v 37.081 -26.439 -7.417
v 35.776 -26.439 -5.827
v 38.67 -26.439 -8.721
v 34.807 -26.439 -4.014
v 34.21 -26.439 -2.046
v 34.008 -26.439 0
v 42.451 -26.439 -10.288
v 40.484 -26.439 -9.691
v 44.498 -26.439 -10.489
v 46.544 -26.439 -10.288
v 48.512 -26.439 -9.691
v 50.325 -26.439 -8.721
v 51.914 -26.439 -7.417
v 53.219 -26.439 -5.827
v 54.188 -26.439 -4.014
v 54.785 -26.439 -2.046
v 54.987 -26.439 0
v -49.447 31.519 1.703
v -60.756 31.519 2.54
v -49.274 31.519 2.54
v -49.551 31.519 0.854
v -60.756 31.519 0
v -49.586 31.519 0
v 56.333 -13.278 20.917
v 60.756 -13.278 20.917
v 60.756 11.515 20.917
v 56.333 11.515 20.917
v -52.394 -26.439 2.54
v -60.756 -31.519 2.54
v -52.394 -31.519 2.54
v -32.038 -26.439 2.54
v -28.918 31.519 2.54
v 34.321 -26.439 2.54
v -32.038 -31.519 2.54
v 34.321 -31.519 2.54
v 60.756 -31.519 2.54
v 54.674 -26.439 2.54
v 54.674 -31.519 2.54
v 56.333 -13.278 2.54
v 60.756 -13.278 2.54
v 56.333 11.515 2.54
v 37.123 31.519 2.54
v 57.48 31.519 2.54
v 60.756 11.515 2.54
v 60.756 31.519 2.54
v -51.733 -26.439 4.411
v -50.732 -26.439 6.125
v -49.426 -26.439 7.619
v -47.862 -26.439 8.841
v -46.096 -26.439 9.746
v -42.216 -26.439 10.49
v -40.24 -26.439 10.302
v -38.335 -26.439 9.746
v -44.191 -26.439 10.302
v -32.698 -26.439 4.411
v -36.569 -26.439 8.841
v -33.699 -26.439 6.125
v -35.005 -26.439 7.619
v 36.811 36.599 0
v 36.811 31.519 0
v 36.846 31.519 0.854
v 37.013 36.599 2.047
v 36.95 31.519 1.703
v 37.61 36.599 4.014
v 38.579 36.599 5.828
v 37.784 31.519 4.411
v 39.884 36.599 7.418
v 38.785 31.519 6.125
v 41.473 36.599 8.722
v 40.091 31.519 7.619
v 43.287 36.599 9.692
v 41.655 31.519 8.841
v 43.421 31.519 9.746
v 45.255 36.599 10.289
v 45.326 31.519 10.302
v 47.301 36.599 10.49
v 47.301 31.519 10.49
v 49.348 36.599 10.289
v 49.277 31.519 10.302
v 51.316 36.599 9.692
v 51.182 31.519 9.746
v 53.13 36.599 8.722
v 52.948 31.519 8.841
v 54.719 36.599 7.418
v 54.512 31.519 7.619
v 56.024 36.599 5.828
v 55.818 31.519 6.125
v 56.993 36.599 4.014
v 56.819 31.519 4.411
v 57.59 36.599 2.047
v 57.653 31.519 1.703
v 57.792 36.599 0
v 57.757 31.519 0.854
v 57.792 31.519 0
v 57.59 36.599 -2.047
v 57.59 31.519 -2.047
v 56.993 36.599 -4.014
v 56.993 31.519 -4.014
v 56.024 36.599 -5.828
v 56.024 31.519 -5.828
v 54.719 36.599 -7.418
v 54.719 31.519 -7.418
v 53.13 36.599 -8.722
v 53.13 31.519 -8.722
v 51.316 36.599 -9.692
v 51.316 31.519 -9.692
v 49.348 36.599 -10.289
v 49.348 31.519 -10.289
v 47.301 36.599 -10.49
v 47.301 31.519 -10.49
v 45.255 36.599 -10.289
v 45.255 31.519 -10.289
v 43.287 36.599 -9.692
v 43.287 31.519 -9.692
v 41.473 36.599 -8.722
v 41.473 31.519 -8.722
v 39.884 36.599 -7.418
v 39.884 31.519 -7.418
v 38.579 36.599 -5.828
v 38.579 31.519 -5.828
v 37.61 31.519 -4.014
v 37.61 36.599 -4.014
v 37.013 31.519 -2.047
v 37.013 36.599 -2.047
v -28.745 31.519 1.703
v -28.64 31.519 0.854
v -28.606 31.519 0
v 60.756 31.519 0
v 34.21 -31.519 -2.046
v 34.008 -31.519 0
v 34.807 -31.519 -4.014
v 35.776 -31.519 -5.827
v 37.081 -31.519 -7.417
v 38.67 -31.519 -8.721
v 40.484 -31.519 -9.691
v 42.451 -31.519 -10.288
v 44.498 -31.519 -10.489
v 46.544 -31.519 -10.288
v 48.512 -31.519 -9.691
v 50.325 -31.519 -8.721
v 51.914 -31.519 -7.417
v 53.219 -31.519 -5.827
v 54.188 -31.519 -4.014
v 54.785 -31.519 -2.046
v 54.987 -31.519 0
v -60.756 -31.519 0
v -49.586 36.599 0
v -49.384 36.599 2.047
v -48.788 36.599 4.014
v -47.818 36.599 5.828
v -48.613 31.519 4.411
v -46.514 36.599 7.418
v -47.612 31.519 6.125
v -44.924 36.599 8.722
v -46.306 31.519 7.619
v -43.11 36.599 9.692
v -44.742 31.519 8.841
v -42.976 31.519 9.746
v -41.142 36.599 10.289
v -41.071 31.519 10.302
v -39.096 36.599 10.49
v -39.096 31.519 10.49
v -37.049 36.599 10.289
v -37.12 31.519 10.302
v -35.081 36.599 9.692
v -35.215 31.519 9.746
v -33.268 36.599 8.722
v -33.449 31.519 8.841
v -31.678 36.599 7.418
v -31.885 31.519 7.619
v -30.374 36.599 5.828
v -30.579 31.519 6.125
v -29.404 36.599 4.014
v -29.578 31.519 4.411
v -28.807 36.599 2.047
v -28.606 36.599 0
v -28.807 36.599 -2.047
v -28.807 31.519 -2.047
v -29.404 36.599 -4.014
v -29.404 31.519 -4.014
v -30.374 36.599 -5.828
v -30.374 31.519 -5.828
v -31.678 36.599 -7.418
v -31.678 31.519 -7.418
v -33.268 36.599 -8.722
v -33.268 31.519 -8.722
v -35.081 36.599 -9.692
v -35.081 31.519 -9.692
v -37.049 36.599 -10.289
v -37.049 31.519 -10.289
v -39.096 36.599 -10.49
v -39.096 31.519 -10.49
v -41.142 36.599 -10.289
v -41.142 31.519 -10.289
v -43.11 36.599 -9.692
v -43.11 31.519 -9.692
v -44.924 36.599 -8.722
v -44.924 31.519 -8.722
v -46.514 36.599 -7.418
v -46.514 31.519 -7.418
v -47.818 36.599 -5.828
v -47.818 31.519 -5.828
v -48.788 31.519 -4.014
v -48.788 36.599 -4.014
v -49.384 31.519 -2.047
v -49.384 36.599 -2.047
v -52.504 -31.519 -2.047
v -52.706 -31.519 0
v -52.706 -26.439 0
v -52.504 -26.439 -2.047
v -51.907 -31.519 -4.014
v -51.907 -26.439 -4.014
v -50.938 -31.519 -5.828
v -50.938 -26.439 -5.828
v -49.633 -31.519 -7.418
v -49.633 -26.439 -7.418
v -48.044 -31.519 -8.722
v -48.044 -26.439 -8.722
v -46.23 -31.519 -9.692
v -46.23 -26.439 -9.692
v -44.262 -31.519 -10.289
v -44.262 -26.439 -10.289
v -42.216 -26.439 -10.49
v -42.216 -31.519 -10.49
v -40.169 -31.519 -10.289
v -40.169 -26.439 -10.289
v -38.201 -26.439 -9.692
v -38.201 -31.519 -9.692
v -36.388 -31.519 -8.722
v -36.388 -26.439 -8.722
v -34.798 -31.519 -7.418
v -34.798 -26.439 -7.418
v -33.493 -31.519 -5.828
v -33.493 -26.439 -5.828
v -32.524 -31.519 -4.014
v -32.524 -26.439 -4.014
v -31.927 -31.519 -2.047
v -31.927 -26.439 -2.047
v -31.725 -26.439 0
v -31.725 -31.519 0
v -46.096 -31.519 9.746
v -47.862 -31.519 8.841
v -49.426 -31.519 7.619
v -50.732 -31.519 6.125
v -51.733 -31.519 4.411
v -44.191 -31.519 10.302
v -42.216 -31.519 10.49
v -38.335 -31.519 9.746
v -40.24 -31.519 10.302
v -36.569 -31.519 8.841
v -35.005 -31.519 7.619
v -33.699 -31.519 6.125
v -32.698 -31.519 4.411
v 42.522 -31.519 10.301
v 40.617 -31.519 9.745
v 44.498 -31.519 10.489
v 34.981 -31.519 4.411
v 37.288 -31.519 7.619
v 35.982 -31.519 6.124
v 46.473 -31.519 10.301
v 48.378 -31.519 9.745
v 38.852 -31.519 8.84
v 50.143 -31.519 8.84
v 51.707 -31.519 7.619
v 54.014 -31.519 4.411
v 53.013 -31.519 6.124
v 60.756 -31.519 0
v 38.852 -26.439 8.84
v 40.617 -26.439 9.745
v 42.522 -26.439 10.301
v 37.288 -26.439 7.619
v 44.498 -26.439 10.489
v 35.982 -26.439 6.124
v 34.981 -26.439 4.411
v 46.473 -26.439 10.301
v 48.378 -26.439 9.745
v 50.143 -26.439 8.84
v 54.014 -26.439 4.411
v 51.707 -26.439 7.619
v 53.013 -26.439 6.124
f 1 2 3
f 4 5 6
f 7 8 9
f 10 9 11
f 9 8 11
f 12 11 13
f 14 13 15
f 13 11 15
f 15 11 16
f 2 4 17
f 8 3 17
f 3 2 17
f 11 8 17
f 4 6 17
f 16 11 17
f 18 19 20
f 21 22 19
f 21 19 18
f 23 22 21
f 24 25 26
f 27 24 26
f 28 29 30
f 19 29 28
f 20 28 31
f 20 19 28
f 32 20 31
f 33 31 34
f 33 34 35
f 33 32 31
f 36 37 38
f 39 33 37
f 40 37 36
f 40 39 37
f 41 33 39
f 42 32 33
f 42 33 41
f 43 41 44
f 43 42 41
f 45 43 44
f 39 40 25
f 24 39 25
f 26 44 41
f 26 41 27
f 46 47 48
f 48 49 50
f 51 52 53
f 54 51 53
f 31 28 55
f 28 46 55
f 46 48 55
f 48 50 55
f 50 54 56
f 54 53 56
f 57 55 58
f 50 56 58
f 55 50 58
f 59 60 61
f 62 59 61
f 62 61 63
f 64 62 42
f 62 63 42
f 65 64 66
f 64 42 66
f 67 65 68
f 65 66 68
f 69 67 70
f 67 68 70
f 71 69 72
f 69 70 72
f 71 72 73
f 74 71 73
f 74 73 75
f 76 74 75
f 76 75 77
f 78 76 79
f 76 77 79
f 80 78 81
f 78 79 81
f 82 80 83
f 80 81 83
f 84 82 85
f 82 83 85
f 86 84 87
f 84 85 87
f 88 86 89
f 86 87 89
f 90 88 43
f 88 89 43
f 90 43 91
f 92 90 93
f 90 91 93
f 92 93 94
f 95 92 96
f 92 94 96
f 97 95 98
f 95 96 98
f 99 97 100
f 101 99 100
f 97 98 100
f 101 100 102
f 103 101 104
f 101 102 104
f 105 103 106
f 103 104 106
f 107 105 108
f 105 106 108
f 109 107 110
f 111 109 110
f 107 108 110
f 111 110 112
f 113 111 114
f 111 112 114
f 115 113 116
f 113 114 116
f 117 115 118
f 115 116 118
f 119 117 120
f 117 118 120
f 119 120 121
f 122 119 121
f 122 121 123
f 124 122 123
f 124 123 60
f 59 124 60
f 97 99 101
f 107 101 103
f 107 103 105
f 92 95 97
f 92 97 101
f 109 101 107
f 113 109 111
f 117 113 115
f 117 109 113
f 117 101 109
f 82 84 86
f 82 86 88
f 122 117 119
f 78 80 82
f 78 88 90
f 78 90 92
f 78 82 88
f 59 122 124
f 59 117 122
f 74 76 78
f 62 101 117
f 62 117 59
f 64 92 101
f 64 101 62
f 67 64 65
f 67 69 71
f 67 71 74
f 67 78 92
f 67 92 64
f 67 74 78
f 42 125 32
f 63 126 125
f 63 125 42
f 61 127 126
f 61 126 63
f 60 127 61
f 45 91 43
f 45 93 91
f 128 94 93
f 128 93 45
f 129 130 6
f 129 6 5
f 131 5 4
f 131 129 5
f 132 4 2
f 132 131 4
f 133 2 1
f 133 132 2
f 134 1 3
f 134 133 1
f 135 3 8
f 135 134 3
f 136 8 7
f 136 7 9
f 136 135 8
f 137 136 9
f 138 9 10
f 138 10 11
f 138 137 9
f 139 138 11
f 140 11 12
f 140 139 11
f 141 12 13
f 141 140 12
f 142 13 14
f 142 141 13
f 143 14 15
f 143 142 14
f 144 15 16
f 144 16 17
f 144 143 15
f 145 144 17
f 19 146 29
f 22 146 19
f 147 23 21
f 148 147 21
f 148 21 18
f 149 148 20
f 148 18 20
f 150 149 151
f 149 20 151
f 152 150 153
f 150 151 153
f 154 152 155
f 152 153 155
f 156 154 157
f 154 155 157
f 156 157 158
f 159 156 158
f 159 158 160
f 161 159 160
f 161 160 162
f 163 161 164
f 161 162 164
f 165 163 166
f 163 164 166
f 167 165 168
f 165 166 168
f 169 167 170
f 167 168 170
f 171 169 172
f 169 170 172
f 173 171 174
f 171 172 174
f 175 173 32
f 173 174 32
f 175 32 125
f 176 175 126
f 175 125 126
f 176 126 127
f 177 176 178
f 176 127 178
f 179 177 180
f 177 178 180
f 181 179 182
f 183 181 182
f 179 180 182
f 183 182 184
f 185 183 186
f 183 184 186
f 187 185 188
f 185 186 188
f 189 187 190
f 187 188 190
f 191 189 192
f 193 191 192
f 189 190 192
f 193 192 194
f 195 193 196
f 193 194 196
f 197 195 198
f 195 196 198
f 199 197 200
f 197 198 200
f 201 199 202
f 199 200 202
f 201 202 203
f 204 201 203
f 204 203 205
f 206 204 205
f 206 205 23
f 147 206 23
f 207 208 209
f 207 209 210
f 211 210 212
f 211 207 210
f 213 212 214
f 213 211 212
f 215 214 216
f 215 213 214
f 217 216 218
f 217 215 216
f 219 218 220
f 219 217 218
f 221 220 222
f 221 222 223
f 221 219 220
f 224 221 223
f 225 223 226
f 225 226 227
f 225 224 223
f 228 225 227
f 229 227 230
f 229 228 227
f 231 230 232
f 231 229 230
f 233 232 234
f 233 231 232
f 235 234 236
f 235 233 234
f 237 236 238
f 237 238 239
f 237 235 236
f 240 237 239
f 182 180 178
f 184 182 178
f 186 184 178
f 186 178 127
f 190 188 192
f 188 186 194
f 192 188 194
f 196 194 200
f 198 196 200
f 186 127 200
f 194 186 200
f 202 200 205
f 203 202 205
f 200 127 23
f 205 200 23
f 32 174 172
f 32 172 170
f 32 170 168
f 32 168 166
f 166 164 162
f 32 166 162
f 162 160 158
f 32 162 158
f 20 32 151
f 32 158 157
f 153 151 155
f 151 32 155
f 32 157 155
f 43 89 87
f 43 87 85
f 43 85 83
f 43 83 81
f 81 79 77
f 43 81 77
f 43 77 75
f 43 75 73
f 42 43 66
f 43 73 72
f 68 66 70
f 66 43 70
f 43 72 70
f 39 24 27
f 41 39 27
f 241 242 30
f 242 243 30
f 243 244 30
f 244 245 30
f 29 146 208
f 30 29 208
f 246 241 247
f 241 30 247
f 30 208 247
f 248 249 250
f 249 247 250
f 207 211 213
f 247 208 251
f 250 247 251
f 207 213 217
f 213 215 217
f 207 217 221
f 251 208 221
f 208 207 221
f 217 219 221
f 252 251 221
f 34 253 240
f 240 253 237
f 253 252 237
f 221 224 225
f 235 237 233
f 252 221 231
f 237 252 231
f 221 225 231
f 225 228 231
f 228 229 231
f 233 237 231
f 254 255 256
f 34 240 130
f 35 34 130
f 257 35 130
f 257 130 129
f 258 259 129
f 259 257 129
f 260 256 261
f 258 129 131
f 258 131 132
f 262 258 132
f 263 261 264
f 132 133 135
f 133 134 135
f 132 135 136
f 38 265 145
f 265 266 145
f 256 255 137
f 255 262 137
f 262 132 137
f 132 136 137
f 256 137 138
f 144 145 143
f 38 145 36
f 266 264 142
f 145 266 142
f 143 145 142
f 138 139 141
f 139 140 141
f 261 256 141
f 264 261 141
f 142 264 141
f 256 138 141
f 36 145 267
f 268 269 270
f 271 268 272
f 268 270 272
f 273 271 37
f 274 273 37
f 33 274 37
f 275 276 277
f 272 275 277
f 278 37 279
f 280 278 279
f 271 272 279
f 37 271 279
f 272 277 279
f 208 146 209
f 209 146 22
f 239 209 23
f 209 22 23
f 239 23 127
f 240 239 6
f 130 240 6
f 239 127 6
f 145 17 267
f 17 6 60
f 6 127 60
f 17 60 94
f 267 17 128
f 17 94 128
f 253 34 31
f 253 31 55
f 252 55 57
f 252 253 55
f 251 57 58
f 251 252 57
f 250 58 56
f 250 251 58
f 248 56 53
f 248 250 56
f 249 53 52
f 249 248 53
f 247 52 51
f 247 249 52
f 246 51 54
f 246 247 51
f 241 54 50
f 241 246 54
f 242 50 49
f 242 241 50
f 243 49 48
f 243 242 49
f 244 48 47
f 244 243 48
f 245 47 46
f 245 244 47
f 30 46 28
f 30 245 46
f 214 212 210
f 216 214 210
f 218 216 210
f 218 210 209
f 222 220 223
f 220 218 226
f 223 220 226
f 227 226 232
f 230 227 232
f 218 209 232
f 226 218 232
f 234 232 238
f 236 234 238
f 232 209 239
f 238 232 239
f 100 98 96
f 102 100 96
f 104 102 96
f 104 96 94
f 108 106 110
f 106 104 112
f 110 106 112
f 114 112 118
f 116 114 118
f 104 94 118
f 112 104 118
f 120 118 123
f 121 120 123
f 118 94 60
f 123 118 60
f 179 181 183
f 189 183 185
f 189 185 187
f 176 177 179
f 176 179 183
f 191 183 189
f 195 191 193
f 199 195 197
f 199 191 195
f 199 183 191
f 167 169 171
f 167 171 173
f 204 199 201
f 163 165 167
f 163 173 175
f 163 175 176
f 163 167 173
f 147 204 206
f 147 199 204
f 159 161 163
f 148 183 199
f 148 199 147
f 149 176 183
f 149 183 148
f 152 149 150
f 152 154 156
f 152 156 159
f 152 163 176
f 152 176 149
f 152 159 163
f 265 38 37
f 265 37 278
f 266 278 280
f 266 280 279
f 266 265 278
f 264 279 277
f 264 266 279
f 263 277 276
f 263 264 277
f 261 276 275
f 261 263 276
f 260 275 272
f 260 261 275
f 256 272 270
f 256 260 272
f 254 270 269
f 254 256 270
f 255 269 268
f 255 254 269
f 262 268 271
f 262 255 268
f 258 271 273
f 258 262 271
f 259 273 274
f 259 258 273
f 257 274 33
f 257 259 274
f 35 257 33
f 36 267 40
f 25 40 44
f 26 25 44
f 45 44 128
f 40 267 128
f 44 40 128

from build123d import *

# Parameters (mm, degrees)
F0_W     = 121.512517333
F0_H     = 63.0381852388
F1_DEPTH = 2.54
F3_R     = 10.4902
F2_R     = 10.4902
F2_R_2   = 10.4891359602
F4_DEPTH = 5.08
F5_W     = 24.793356657
F5_H     = 18.3770691669
F6_DEPTH = 4.4237


with BuildPart() as f1:
    # F0 (on Top) → F1 (new body)
    with BuildSketch(Plane.XY):
        Rectangle(F0_W, F0_H)
    extrude(amount=F1_DEPTH)

    # F3 (on face) + F2 (on face) → F4 (join)
    with BuildSketch(Plane(origin=(0, 31.5190926194, 0), x_dir=(-1, 0, 0), z_dir=(0, 1, 0))):
        with Locations((-47.3014861345, 0)):
            Circle(F3_R)
        with Locations((39.0958227217, 0)):
            Circle(F3_R)
    with BuildSketch(Plane.XZ.offset(31.5190926194)):
        with Locations((-42.2156155109, 0)):
            Circle(F2_R)
        with Locations((44.4975420833, 0)):
            Circle(F2_R_2)
    extrude(amount=F4_DEPTH, dir=(0, 1, 0))

    # F5 (on face) → F6 (join)
    with BuildSketch(Plane.YZ.offset(60.7562586665)):
        with Locations((-0.8818171918, 11.7285345834)):
            Rectangle(F5_W, F5_H)
    extrude(amount=-F6_DEPTH)


solid = f1.part
